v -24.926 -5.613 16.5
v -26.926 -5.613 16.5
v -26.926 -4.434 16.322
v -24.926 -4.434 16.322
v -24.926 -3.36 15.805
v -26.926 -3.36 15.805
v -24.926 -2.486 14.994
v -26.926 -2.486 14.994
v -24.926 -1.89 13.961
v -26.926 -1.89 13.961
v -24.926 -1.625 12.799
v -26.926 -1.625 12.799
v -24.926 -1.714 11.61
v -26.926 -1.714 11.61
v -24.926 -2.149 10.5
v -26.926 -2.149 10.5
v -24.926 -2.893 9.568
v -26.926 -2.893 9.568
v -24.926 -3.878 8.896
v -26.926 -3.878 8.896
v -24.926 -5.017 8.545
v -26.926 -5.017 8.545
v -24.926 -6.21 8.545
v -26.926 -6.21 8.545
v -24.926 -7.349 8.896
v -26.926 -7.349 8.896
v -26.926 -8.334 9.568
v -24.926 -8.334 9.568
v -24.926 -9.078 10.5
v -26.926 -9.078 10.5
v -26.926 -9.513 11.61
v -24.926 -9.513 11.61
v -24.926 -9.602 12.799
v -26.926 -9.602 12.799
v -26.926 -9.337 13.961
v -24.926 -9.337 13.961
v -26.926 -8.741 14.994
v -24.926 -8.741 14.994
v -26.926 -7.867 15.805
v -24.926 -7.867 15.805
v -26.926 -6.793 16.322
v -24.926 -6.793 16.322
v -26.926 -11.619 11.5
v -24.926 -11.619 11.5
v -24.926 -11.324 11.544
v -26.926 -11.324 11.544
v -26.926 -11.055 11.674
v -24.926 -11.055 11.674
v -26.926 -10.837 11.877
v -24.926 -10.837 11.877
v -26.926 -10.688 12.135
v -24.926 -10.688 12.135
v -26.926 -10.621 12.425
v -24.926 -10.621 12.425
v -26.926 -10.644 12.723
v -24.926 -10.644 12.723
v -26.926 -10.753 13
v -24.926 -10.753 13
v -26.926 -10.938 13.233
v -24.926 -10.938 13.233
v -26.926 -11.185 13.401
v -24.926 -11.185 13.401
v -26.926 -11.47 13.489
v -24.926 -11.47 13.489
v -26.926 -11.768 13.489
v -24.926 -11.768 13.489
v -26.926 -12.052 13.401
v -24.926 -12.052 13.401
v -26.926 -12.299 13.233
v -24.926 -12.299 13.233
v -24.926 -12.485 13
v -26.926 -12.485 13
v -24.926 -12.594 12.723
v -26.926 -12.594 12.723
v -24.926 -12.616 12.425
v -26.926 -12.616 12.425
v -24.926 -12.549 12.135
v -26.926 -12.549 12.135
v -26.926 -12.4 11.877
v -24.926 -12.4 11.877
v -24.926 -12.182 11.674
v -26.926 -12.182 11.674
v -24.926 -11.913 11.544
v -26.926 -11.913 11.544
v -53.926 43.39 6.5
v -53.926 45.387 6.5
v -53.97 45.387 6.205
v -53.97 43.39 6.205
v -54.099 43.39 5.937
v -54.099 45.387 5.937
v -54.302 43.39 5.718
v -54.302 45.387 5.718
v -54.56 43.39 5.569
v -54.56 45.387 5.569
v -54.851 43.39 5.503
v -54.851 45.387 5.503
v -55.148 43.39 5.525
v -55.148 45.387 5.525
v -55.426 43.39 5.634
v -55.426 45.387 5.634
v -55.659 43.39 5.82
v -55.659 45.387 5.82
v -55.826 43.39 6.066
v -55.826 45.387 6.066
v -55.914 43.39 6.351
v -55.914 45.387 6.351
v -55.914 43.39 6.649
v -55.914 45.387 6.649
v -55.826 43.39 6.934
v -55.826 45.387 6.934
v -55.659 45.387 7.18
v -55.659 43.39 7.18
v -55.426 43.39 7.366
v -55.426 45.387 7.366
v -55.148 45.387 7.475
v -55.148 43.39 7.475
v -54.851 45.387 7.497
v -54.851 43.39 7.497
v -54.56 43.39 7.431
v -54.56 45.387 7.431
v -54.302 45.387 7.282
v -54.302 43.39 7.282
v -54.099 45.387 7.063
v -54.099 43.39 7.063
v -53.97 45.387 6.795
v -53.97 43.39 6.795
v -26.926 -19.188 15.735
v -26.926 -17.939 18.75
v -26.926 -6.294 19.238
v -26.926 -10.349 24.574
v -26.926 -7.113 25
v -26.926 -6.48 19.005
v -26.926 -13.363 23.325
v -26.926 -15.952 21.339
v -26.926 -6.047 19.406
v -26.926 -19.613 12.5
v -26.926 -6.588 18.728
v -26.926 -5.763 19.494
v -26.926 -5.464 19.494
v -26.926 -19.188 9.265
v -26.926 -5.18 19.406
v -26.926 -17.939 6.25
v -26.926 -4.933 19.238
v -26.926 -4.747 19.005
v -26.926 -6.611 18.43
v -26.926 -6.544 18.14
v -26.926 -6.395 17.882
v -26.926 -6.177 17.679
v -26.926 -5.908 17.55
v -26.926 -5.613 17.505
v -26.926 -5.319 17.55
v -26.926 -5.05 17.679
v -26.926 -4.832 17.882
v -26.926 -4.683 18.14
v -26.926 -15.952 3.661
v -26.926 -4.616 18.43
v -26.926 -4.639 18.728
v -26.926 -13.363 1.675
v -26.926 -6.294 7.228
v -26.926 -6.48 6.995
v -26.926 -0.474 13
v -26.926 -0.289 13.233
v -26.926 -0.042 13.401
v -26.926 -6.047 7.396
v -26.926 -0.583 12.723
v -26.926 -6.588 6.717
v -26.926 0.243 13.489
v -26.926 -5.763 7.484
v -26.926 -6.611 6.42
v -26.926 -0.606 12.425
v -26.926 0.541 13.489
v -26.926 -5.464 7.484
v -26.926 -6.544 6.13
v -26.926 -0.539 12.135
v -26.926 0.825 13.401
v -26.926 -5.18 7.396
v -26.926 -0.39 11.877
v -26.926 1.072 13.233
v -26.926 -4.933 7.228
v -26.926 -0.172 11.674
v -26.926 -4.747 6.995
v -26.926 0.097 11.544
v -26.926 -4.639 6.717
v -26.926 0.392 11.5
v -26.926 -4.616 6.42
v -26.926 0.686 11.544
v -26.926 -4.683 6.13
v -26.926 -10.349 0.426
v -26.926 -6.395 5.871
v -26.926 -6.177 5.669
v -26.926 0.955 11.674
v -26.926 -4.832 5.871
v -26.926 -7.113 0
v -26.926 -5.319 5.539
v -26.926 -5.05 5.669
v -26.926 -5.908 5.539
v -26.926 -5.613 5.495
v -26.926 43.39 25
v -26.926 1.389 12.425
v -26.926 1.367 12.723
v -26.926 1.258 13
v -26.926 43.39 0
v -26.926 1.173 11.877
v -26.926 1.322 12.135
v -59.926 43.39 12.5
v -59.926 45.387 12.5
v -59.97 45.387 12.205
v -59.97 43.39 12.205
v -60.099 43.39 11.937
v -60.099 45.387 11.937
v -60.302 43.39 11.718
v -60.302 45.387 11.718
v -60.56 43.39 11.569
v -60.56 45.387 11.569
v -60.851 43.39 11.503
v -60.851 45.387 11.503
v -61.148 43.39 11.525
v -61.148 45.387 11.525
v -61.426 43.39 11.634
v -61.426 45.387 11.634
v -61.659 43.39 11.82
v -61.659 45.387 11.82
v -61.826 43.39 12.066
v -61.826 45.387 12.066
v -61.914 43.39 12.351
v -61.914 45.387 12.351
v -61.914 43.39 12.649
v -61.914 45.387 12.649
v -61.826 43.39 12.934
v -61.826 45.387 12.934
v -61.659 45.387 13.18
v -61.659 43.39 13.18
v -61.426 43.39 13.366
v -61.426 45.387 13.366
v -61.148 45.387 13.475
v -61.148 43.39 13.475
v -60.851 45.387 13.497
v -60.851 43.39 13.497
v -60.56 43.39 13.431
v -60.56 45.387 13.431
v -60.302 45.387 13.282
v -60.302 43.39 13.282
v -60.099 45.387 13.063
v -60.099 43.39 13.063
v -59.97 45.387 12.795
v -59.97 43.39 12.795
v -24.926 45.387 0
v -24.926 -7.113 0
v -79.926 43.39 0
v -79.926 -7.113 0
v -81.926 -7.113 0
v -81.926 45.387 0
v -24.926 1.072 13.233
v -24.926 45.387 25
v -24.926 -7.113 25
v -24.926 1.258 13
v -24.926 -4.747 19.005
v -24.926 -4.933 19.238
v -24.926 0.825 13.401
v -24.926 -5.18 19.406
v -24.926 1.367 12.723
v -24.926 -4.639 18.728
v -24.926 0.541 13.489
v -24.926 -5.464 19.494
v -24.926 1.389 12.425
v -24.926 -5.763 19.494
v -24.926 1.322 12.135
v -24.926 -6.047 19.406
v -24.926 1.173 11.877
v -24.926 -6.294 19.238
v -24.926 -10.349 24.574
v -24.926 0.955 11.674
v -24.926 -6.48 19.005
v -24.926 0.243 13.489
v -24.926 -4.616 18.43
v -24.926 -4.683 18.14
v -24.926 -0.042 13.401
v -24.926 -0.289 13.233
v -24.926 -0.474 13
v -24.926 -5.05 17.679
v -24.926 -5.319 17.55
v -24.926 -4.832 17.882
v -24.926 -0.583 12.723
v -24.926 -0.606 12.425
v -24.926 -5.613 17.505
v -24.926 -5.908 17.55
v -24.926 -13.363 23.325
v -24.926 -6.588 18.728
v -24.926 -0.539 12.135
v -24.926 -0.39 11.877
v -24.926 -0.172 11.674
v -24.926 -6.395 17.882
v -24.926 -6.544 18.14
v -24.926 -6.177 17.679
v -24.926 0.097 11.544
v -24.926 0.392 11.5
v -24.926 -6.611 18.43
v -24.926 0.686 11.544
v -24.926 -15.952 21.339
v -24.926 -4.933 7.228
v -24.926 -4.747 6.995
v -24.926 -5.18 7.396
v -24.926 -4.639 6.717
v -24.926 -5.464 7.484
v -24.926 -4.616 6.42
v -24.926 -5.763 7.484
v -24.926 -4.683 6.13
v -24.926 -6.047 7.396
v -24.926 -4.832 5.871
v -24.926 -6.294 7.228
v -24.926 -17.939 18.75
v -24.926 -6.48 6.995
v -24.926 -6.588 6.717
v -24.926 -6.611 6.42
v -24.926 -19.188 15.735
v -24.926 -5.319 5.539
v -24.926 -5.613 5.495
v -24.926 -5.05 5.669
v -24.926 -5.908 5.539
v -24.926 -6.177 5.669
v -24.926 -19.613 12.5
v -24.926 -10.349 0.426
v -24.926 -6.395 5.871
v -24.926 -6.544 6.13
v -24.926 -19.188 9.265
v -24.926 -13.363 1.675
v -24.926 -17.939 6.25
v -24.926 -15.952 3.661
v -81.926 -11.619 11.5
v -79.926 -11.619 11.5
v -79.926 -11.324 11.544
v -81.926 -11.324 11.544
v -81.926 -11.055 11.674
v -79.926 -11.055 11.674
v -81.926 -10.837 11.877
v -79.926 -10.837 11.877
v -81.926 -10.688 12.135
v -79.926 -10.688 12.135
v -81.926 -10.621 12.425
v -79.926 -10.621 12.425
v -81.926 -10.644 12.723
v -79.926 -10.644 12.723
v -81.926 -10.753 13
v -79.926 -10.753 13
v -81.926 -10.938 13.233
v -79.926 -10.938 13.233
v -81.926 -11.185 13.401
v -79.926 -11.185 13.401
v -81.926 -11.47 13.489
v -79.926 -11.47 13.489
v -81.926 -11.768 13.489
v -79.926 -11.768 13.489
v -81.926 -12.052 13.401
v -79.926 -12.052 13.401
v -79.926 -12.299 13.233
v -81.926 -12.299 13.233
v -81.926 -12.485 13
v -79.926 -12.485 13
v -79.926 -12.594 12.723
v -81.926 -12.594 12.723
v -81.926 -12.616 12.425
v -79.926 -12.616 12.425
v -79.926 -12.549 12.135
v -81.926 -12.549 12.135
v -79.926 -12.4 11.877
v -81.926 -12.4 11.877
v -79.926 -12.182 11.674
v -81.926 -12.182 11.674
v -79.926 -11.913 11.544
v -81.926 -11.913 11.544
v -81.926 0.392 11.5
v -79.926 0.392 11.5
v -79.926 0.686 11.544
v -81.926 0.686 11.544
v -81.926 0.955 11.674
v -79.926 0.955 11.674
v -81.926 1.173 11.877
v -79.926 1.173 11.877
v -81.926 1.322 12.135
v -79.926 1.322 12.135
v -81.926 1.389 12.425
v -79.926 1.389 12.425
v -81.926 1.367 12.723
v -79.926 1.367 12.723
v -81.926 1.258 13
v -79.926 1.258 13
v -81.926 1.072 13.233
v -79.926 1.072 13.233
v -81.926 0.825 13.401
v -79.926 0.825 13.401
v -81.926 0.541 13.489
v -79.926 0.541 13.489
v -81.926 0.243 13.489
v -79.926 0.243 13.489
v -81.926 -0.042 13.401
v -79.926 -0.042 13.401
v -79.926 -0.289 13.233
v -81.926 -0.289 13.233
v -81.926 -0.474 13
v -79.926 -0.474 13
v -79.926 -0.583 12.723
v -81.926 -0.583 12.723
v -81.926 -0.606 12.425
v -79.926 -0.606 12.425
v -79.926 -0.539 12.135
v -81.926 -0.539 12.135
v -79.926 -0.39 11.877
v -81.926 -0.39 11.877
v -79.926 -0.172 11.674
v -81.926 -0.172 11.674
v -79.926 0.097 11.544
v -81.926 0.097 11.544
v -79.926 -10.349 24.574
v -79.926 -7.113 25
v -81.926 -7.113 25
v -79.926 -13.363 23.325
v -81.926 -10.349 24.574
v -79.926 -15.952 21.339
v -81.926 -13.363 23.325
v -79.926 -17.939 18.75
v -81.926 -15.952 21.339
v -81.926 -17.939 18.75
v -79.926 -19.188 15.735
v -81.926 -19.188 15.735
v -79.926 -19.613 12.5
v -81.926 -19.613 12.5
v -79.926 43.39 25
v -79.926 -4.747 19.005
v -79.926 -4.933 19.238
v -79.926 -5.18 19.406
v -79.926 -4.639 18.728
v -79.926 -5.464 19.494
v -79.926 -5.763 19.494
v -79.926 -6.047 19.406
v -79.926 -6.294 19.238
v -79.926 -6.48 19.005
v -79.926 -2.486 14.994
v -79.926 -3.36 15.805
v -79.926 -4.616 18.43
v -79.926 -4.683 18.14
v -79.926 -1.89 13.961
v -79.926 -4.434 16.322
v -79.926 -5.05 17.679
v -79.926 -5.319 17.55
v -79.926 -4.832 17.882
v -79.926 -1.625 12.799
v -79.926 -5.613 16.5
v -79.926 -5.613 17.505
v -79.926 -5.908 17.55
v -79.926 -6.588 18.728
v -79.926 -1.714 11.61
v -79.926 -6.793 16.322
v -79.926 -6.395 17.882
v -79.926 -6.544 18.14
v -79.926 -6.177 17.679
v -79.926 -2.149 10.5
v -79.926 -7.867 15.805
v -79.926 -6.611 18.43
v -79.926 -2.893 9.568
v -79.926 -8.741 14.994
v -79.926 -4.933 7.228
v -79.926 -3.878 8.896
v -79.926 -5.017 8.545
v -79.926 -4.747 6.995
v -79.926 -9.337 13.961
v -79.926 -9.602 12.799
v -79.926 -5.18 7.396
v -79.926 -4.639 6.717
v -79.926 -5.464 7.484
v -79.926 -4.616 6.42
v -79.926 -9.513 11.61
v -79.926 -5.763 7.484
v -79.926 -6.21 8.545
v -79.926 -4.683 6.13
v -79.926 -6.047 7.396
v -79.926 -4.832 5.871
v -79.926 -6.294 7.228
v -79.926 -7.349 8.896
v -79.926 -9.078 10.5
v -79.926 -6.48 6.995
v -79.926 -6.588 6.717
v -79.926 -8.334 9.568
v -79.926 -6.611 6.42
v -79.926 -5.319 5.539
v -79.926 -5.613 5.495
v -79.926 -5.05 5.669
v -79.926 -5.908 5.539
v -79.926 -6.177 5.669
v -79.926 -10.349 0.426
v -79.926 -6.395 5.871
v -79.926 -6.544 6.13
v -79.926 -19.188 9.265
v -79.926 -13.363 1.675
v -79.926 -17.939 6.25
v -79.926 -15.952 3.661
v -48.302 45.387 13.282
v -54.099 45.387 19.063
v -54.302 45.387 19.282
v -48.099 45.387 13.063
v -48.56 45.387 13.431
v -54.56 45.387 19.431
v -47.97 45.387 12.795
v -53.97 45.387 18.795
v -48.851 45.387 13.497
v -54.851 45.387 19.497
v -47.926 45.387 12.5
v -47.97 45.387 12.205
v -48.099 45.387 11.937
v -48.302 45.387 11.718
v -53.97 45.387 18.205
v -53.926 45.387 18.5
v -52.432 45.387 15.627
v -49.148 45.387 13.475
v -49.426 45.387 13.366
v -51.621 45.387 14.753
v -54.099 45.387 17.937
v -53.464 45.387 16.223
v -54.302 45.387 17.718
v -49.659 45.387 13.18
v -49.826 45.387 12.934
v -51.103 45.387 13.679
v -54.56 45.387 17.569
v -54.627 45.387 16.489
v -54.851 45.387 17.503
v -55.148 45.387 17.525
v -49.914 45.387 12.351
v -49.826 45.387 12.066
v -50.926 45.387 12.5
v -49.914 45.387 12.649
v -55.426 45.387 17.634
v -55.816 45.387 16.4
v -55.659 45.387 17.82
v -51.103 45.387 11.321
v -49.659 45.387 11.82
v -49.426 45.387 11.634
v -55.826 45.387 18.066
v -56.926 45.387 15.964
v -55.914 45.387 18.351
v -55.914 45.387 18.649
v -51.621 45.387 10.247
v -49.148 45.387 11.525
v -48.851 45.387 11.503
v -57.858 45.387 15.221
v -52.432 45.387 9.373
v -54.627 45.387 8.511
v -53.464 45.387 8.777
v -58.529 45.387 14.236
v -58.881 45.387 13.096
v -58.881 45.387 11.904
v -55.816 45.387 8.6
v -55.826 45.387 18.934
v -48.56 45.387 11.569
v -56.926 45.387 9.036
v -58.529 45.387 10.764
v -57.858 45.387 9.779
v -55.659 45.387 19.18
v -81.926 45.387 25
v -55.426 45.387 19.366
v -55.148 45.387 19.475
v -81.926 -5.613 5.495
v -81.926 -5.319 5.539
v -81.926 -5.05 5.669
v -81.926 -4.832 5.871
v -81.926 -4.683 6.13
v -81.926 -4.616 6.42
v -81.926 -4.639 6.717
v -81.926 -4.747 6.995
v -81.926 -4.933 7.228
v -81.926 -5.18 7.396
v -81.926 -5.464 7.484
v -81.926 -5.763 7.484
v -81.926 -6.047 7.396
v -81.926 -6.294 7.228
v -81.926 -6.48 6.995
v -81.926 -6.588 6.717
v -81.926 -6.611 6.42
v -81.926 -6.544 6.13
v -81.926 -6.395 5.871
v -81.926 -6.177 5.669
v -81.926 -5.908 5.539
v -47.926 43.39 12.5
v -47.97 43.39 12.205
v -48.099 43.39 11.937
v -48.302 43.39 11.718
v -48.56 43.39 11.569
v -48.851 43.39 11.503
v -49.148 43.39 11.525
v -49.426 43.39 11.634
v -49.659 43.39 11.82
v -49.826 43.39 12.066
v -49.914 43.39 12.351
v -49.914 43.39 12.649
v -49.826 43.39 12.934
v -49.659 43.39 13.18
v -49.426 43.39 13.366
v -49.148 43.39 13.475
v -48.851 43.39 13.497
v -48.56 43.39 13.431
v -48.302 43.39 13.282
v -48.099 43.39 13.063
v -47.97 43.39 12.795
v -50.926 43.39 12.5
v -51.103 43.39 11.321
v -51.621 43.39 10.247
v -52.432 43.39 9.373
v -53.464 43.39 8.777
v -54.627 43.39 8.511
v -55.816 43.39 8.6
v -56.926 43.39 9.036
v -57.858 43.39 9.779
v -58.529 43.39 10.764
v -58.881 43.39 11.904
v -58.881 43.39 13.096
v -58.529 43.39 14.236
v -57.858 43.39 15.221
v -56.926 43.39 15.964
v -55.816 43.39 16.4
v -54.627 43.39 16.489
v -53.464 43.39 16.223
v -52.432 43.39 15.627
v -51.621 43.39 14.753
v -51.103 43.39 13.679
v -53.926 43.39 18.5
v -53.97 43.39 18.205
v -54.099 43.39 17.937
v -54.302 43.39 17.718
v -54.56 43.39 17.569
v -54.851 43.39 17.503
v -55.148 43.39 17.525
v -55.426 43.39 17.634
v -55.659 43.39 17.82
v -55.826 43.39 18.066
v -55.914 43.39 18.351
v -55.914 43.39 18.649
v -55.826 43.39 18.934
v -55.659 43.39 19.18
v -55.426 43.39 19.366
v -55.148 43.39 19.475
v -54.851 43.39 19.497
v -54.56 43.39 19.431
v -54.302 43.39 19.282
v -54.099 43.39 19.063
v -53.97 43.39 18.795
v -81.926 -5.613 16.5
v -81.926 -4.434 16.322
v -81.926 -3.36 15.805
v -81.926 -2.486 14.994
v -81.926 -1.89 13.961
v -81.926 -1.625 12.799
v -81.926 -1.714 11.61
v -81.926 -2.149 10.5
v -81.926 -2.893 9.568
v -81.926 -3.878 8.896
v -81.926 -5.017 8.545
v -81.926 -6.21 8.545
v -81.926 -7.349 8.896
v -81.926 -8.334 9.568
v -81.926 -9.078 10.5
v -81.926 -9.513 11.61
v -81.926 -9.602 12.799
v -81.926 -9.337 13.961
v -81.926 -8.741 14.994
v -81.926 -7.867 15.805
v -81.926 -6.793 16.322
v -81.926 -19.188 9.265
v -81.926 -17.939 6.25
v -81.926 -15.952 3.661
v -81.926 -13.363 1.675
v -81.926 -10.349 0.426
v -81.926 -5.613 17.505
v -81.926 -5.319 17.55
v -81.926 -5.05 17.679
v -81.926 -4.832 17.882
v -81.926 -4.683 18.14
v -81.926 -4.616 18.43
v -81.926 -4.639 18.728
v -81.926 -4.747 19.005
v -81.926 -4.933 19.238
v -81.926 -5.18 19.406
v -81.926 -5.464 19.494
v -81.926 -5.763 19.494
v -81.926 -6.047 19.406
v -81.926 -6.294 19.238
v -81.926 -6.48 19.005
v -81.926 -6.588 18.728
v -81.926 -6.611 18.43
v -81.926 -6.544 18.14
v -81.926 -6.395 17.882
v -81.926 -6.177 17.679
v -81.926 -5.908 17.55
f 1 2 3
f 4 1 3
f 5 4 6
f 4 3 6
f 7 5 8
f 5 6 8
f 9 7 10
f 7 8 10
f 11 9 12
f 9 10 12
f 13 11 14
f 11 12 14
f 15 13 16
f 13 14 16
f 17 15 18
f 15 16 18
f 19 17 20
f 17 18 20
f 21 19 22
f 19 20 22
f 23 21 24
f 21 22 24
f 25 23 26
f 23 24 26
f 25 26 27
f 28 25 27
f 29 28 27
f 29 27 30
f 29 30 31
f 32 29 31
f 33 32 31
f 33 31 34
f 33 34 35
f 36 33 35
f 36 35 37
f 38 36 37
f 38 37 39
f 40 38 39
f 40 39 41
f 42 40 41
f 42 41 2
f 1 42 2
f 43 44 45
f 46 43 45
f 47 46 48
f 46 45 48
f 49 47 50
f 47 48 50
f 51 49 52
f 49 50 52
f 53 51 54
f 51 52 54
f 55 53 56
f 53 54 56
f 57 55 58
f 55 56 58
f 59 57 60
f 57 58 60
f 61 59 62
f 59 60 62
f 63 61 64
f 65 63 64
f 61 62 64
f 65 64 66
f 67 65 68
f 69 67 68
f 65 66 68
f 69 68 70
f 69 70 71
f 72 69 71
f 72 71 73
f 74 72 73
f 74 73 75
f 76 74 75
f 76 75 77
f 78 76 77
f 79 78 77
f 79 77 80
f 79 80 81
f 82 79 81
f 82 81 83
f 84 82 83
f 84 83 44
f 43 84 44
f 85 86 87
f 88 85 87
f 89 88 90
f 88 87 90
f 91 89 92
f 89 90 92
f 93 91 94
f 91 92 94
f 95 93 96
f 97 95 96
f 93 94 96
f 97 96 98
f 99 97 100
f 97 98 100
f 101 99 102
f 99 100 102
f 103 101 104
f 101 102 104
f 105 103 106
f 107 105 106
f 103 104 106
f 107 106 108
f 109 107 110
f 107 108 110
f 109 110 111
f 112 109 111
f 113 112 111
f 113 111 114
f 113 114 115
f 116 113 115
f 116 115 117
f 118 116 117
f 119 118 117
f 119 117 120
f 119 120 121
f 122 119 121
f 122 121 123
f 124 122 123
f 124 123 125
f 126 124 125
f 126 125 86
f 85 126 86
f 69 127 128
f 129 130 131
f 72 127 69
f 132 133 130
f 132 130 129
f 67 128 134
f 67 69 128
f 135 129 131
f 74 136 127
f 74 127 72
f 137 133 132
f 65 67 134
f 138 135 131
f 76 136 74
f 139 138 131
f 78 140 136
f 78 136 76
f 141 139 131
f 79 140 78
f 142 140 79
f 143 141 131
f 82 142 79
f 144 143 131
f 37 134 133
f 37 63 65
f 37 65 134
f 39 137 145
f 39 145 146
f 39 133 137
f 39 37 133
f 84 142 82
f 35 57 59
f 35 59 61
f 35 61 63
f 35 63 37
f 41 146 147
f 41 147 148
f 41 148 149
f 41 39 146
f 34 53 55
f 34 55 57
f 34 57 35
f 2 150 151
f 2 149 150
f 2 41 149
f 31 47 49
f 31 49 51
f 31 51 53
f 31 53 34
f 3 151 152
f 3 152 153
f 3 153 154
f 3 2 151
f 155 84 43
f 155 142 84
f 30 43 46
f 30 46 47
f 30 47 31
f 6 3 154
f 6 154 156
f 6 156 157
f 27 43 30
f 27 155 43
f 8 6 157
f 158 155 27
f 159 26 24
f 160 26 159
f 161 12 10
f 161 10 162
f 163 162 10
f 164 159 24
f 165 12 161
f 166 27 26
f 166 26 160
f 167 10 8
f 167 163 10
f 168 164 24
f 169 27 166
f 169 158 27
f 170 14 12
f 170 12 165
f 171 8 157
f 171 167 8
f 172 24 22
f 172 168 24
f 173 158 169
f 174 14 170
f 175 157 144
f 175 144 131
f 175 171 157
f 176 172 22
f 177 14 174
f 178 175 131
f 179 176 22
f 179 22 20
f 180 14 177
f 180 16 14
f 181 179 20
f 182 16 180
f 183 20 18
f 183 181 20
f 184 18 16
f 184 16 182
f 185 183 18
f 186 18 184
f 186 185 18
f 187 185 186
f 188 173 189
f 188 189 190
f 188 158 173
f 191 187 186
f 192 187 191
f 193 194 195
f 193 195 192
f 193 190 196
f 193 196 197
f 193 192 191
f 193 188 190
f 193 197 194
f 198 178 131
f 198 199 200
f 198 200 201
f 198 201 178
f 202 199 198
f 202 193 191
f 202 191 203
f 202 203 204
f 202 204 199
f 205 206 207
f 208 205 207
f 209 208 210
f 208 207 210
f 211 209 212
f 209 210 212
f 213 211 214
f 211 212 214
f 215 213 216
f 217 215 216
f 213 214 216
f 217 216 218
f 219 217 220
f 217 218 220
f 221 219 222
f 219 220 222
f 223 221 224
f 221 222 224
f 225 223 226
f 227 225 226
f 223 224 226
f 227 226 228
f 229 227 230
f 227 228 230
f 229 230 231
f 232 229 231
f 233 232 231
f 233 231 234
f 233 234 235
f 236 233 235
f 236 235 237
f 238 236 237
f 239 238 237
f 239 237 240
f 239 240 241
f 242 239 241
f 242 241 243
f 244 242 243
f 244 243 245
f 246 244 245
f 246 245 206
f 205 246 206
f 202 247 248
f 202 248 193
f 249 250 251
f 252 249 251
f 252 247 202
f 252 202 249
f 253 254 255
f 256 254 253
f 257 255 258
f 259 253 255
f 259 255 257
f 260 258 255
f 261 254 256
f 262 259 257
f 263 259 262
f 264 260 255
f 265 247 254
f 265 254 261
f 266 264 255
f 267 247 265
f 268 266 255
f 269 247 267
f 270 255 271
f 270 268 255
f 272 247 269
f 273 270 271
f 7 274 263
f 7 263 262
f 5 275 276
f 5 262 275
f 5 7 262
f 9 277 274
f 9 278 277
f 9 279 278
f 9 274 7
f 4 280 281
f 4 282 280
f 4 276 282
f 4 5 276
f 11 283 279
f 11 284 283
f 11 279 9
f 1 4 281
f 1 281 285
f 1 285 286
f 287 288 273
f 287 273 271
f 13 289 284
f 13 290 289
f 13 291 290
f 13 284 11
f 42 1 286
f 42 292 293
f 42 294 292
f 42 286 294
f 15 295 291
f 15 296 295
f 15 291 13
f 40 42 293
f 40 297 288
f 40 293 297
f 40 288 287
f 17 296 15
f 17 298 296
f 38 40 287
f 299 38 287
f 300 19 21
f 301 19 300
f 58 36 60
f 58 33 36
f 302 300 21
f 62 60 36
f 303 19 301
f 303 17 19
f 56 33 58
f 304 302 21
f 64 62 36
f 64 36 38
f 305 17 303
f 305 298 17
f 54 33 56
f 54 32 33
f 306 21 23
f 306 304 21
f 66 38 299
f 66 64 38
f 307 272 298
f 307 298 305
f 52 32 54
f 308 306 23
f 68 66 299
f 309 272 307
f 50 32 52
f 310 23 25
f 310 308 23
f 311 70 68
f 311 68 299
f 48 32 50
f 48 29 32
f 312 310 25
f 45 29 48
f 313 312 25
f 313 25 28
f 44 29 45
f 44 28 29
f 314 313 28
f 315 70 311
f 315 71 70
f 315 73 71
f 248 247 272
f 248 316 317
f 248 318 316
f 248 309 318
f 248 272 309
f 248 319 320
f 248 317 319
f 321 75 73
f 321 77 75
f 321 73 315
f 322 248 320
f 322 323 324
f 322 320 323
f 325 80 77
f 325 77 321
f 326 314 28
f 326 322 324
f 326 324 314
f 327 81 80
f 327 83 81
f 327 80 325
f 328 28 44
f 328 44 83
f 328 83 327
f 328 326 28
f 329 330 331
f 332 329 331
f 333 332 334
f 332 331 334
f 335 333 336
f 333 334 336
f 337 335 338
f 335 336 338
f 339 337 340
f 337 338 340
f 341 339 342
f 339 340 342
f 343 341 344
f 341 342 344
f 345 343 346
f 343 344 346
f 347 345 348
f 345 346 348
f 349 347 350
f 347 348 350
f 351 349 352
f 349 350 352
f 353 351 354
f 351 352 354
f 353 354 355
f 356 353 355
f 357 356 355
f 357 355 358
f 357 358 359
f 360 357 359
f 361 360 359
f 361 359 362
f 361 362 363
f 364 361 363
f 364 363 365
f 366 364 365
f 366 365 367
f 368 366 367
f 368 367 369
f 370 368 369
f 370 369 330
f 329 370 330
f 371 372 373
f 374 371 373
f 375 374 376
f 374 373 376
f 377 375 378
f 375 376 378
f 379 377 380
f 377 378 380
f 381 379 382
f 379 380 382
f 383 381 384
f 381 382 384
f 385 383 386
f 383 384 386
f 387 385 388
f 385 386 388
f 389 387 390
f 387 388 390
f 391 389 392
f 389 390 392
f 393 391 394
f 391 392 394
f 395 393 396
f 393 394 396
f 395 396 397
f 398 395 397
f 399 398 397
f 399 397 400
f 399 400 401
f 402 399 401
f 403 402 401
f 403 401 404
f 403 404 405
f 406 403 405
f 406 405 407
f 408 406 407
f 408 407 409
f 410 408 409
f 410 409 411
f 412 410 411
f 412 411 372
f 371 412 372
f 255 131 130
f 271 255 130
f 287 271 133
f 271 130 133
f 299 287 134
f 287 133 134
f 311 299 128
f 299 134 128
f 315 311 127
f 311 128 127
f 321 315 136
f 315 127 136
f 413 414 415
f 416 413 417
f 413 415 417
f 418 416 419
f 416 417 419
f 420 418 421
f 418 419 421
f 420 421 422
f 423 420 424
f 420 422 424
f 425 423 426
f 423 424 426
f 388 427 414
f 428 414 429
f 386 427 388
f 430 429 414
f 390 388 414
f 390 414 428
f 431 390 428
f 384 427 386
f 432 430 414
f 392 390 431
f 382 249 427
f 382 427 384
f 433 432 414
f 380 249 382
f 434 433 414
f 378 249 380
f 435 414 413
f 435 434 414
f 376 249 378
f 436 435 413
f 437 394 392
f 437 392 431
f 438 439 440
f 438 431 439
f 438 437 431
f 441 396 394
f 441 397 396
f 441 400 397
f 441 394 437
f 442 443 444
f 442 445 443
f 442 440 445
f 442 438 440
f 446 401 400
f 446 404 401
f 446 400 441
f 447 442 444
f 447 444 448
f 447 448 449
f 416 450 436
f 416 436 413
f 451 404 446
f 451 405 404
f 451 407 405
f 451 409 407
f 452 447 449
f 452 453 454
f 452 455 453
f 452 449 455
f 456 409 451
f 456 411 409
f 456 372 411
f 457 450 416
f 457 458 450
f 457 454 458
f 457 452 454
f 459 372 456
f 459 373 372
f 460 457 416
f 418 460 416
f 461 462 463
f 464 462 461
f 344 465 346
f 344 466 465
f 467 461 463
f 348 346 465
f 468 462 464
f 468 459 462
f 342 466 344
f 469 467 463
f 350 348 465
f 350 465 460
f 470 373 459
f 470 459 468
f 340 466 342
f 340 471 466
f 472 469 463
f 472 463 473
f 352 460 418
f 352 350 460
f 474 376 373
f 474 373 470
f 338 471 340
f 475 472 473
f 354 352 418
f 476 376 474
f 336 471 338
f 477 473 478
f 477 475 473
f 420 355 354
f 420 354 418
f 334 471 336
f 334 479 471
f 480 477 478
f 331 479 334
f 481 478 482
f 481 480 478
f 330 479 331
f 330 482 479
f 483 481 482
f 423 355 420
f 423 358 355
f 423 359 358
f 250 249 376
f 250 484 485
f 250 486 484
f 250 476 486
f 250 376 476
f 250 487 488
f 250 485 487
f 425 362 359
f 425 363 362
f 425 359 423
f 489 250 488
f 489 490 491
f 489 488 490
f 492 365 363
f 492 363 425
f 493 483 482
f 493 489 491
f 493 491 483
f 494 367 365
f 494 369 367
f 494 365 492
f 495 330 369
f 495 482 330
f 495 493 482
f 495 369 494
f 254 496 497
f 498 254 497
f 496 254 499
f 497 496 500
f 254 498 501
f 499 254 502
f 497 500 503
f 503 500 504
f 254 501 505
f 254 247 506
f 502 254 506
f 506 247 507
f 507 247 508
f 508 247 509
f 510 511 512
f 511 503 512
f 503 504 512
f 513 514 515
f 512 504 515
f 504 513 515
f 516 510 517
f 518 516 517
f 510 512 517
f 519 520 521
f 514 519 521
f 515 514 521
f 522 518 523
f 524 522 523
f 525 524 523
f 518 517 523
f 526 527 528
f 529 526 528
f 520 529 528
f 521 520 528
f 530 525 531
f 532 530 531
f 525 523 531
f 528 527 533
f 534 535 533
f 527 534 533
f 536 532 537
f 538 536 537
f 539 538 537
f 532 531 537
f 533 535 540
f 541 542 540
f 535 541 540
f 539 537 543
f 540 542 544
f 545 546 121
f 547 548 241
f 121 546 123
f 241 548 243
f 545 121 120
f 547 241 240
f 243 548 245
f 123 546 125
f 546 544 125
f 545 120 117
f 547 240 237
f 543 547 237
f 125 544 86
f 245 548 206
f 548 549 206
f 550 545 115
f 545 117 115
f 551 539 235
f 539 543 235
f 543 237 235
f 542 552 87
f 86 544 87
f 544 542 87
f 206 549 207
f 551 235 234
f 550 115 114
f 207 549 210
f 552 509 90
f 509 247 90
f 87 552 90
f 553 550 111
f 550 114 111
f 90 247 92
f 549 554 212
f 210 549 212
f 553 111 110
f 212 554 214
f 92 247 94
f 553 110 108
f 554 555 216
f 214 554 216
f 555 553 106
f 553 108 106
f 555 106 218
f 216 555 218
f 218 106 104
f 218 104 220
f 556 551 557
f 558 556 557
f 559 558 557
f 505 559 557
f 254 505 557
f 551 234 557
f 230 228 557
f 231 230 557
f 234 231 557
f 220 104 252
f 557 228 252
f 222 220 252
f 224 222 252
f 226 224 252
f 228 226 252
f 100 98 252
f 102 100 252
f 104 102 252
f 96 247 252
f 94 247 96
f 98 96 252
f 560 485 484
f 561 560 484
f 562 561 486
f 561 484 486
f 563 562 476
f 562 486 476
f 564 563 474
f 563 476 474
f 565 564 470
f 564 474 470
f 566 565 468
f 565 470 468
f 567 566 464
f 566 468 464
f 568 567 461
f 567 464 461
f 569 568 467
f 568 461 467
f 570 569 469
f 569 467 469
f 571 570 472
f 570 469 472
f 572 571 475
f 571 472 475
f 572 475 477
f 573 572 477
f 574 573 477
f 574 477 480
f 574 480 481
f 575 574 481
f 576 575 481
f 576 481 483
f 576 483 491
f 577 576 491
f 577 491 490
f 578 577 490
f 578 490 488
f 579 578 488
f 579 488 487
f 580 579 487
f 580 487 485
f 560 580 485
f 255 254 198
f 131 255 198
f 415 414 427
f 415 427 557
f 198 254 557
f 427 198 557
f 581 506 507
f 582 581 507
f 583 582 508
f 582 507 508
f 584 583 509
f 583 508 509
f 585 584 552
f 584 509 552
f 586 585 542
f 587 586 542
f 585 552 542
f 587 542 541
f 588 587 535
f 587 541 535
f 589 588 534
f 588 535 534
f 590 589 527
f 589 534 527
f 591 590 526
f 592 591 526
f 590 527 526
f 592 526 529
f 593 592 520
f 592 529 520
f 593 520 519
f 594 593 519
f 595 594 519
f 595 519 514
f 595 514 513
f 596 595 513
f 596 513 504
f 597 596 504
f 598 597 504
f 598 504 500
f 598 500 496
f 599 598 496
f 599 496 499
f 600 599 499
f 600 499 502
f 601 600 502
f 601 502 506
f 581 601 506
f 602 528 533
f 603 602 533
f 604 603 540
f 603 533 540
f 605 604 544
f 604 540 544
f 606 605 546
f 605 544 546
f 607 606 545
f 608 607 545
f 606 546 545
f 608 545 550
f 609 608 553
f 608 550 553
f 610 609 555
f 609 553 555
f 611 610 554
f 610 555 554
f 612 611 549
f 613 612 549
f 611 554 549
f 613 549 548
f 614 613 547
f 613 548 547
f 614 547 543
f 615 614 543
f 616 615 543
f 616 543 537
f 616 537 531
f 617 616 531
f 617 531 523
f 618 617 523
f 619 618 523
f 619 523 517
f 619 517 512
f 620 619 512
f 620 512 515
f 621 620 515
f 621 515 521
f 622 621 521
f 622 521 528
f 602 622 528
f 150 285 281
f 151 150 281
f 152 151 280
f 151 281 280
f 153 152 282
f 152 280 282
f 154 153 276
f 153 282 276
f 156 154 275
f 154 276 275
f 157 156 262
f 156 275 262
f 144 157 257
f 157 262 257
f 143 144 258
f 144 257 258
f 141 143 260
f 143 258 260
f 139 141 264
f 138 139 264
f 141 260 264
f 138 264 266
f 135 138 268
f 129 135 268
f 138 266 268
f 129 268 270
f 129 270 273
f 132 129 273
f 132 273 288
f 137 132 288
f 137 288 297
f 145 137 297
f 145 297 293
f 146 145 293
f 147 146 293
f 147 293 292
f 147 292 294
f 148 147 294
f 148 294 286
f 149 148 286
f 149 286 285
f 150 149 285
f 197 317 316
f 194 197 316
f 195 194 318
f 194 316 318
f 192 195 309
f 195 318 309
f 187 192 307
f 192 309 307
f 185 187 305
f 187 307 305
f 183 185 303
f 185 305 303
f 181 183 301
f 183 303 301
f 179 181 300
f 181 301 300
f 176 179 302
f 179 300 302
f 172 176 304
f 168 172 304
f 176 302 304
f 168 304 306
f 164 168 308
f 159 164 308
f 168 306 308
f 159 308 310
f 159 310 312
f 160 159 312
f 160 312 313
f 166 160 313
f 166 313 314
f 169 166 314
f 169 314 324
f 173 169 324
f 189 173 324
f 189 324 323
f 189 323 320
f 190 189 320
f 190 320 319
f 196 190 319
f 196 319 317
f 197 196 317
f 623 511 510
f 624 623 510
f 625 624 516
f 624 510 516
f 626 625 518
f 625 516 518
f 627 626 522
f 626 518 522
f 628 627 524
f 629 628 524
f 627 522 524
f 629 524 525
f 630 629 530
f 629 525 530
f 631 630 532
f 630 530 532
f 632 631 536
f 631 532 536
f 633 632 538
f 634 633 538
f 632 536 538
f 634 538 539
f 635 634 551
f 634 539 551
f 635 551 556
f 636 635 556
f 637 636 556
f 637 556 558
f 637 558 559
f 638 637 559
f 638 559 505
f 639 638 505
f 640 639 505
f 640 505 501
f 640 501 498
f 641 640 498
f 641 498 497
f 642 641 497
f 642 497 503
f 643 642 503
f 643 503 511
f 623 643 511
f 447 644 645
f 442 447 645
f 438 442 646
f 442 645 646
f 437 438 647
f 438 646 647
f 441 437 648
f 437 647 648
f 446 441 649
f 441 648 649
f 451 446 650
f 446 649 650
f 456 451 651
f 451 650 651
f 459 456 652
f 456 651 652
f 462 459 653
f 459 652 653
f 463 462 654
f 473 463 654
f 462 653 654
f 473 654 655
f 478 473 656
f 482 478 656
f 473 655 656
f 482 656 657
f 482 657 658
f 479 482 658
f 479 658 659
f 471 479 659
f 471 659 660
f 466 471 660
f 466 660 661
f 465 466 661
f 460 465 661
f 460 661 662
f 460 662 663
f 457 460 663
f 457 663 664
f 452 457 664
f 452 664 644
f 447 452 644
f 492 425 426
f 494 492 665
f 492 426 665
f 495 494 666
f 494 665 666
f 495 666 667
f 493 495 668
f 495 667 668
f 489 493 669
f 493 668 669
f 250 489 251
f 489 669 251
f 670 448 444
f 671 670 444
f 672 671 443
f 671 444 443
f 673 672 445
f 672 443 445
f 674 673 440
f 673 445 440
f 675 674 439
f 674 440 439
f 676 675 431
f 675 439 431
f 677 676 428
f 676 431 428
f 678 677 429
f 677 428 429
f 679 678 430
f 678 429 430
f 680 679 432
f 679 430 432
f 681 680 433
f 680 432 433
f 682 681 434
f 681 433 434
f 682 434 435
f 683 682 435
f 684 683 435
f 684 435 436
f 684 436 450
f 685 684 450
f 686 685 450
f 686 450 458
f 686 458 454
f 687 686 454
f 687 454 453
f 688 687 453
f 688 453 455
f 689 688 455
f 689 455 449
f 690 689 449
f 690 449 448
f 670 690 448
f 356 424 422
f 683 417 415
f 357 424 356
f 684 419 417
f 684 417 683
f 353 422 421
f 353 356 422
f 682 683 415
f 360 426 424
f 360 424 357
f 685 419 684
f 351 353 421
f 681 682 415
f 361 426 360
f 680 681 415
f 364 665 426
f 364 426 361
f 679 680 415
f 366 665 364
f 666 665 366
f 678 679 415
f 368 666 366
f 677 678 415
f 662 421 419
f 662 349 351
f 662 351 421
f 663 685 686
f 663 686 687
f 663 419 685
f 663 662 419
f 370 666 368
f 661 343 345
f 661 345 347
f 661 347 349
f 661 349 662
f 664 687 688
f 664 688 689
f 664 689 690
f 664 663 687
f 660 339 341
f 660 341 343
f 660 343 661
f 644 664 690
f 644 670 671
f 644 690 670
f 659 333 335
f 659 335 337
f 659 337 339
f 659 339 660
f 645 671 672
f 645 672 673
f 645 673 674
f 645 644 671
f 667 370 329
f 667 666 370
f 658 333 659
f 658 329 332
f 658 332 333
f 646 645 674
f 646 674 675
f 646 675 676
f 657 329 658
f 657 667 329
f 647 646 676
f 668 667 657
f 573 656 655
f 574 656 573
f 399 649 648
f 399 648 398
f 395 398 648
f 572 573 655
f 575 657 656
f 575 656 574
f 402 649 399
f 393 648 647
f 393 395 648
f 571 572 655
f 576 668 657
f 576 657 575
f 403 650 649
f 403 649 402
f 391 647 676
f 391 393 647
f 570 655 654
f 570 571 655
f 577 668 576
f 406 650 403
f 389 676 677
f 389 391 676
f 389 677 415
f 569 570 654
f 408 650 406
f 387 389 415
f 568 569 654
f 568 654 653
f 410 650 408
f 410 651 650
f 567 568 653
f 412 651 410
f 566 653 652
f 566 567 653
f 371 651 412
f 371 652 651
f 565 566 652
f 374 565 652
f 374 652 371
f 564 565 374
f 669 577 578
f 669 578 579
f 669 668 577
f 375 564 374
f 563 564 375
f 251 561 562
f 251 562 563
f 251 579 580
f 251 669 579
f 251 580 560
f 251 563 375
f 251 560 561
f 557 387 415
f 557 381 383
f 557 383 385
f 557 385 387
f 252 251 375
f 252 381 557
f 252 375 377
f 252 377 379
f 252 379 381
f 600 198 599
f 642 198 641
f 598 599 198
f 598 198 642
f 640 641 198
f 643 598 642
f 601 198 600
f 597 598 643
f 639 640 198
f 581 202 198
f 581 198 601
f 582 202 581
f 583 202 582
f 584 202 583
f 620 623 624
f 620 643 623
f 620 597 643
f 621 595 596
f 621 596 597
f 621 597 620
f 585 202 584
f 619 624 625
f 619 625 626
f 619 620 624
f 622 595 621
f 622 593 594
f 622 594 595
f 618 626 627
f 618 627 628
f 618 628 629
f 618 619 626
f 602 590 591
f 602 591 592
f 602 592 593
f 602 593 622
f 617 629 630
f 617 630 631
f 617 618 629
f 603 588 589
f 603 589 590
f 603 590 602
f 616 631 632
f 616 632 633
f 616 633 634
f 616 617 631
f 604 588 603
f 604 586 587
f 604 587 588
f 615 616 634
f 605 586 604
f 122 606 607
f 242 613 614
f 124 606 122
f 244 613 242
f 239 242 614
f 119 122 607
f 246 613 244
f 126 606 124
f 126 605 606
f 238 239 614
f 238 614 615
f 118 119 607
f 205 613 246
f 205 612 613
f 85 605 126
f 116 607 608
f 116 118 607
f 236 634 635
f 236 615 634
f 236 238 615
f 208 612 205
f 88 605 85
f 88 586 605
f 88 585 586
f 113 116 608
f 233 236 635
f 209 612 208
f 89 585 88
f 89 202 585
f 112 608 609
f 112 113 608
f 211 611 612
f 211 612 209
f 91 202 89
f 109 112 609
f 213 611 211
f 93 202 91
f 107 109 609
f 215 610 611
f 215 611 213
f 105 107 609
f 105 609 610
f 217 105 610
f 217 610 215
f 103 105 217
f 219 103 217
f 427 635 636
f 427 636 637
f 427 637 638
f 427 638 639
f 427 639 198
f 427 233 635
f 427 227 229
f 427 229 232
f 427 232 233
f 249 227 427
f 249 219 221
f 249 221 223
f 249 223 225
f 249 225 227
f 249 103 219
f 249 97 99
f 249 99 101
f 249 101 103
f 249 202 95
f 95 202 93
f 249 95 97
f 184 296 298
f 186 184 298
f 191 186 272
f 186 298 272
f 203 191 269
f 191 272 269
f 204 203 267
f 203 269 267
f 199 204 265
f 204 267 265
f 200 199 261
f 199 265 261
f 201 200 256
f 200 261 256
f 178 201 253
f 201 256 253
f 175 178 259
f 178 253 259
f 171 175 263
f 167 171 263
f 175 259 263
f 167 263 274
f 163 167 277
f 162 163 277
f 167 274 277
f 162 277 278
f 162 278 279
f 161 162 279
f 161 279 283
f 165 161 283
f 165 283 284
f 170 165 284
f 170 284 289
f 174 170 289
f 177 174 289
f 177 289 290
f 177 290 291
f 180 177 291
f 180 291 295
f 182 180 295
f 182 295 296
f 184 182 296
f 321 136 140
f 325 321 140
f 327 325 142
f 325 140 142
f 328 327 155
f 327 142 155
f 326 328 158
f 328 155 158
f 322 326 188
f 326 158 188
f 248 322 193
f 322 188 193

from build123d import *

# Parameters (mm, degrees)
BOSS_EXTRUDE2_DEPTH = 25
SKETCH4_R           = 4
CUT_EXTRUDE1_DEPTH  = 66
SKETCH6_R           = 4
CUT_EXTRUDE2_DEPTH  = 58
CUT_EXTRUDE3_DEPTH  = 58
SKETCH9_R           = 1
CUT_EXTRUDE4_DEPTH  = 58
SKETCH10_R          = 1
CUT_EXTRUDE5_DEPTH  = 66


with BuildPart() as part:
    # Sketch3 → Boss-Extrude2 (new body)
    with BuildSketch(Plane.XY):
        Polygon((-79.925523148, 45.386502584), (-27.042967192, 45.386502584), (-24.925523148, 45.386502584), (-24.925523148, -19.613497416), (-26.925523148, -19.613497416), (-26.925523148, 43.389953837), (-79.925523148, 43.389953837), (-79.925523148, -19.613497416), (-81.925523148, -19.613497416), (-81.925523148, 45.386502584), align=None)
    extrude(amount=BOSS_EXTRUDE2_DEPTH)

    # Sketch4 → Cut-Extrude1 (cut, through all)
    with BuildSketch(Plane(origin=(0, 45.386502584, 0), x_dir=(1, 0, 0), z_dir=(0, 1, 0))):
        with Locations((-54.925523148, -12.5)):
            Circle(SKETCH4_R)
    extrude(amount=-CUT_EXTRUDE1_DEPTH, mode=Mode.SUBTRACT)

    # Sketch6 → Cut-Extrude2 (cut, through all)
    with BuildSketch(Plane.ZY.offset(81.925523148)):
        with Locations((12.5, -5.613497416)):
            Circle(SKETCH6_R)
    extrude(amount=-CUT_EXTRUDE2_DEPTH, mode=Mode.SUBTRACT)

    # Sketch8 → Cut-Extrude3 (cut, through all)
    with BuildSketch(Plane.ZY.offset(81.925523148)):
        with BuildLine():
            Line((0, -19.613497416), (12.5, -19.613497416))
            ThreePointArc((12.5, -19.613497416), (3.661165213, -15.952332159), (0, -7.113497352))
            Line((0, -7.113497352), (0, -19.613497416))
        make_face()
        with BuildLine():
            Line((12.5, -19.613497416), (25, -19.613497416))
            Line((25, -19.613497416), (25, -7.113497416))
            ThreePointArc((25, -7.113497416), (21.338834765, -15.952332181), (12.5, -19.613497416))
        make_face()
    extrude(amount=-CUT_EXTRUDE3_DEPTH, mode=Mode.SUBTRACT)

    # Sketch9 → Cut-Extrude4 (cut, through all)
    with BuildSketch(Plane(origin=(-24.925523148, 0, 0), x_dir=(0, 0, -1), z_dir=(1, 0, 0))):
        with Locations((-12.5, -11.6185898)):
            Circle(SKETCH9_R)
        with Locations((-18.505092383, -5.613497416)):
            Circle(SKETCH9_R)
        with Locations((-6.494907617, -5.613497416)):
            Circle(SKETCH9_R)
        with Locations((-12.5, 0.391594967)):
            Circle(SKETCH9_R)
    extrude(amount=-CUT_EXTRUDE4_DEPTH, mode=Mode.SUBTRACT)

    # Sketch10 → Cut-Extrude5 (cut, through all)
    with BuildSketch(Plane(origin=(0, 45.386502584, 0), x_dir=(1, 0, 0), z_dir=(0, 1, 0))):
        with Locations((-48.925524223, -12.499998866)):
            Circle(SKETCH10_R)
        with Locations((-54.925524223, -6.499998866)):
            Circle(SKETCH10_R)
        with Locations((-54.925524223, -18.499998866)):
            Circle(SKETCH10_R)
        with Locations((-60.925524223, -12.499998866)):
            Circle(SKETCH10_R)
    extrude(amount=-CUT_EXTRUDE5_DEPTH, mode=Mode.SUBTRACT)


solid = part.part
